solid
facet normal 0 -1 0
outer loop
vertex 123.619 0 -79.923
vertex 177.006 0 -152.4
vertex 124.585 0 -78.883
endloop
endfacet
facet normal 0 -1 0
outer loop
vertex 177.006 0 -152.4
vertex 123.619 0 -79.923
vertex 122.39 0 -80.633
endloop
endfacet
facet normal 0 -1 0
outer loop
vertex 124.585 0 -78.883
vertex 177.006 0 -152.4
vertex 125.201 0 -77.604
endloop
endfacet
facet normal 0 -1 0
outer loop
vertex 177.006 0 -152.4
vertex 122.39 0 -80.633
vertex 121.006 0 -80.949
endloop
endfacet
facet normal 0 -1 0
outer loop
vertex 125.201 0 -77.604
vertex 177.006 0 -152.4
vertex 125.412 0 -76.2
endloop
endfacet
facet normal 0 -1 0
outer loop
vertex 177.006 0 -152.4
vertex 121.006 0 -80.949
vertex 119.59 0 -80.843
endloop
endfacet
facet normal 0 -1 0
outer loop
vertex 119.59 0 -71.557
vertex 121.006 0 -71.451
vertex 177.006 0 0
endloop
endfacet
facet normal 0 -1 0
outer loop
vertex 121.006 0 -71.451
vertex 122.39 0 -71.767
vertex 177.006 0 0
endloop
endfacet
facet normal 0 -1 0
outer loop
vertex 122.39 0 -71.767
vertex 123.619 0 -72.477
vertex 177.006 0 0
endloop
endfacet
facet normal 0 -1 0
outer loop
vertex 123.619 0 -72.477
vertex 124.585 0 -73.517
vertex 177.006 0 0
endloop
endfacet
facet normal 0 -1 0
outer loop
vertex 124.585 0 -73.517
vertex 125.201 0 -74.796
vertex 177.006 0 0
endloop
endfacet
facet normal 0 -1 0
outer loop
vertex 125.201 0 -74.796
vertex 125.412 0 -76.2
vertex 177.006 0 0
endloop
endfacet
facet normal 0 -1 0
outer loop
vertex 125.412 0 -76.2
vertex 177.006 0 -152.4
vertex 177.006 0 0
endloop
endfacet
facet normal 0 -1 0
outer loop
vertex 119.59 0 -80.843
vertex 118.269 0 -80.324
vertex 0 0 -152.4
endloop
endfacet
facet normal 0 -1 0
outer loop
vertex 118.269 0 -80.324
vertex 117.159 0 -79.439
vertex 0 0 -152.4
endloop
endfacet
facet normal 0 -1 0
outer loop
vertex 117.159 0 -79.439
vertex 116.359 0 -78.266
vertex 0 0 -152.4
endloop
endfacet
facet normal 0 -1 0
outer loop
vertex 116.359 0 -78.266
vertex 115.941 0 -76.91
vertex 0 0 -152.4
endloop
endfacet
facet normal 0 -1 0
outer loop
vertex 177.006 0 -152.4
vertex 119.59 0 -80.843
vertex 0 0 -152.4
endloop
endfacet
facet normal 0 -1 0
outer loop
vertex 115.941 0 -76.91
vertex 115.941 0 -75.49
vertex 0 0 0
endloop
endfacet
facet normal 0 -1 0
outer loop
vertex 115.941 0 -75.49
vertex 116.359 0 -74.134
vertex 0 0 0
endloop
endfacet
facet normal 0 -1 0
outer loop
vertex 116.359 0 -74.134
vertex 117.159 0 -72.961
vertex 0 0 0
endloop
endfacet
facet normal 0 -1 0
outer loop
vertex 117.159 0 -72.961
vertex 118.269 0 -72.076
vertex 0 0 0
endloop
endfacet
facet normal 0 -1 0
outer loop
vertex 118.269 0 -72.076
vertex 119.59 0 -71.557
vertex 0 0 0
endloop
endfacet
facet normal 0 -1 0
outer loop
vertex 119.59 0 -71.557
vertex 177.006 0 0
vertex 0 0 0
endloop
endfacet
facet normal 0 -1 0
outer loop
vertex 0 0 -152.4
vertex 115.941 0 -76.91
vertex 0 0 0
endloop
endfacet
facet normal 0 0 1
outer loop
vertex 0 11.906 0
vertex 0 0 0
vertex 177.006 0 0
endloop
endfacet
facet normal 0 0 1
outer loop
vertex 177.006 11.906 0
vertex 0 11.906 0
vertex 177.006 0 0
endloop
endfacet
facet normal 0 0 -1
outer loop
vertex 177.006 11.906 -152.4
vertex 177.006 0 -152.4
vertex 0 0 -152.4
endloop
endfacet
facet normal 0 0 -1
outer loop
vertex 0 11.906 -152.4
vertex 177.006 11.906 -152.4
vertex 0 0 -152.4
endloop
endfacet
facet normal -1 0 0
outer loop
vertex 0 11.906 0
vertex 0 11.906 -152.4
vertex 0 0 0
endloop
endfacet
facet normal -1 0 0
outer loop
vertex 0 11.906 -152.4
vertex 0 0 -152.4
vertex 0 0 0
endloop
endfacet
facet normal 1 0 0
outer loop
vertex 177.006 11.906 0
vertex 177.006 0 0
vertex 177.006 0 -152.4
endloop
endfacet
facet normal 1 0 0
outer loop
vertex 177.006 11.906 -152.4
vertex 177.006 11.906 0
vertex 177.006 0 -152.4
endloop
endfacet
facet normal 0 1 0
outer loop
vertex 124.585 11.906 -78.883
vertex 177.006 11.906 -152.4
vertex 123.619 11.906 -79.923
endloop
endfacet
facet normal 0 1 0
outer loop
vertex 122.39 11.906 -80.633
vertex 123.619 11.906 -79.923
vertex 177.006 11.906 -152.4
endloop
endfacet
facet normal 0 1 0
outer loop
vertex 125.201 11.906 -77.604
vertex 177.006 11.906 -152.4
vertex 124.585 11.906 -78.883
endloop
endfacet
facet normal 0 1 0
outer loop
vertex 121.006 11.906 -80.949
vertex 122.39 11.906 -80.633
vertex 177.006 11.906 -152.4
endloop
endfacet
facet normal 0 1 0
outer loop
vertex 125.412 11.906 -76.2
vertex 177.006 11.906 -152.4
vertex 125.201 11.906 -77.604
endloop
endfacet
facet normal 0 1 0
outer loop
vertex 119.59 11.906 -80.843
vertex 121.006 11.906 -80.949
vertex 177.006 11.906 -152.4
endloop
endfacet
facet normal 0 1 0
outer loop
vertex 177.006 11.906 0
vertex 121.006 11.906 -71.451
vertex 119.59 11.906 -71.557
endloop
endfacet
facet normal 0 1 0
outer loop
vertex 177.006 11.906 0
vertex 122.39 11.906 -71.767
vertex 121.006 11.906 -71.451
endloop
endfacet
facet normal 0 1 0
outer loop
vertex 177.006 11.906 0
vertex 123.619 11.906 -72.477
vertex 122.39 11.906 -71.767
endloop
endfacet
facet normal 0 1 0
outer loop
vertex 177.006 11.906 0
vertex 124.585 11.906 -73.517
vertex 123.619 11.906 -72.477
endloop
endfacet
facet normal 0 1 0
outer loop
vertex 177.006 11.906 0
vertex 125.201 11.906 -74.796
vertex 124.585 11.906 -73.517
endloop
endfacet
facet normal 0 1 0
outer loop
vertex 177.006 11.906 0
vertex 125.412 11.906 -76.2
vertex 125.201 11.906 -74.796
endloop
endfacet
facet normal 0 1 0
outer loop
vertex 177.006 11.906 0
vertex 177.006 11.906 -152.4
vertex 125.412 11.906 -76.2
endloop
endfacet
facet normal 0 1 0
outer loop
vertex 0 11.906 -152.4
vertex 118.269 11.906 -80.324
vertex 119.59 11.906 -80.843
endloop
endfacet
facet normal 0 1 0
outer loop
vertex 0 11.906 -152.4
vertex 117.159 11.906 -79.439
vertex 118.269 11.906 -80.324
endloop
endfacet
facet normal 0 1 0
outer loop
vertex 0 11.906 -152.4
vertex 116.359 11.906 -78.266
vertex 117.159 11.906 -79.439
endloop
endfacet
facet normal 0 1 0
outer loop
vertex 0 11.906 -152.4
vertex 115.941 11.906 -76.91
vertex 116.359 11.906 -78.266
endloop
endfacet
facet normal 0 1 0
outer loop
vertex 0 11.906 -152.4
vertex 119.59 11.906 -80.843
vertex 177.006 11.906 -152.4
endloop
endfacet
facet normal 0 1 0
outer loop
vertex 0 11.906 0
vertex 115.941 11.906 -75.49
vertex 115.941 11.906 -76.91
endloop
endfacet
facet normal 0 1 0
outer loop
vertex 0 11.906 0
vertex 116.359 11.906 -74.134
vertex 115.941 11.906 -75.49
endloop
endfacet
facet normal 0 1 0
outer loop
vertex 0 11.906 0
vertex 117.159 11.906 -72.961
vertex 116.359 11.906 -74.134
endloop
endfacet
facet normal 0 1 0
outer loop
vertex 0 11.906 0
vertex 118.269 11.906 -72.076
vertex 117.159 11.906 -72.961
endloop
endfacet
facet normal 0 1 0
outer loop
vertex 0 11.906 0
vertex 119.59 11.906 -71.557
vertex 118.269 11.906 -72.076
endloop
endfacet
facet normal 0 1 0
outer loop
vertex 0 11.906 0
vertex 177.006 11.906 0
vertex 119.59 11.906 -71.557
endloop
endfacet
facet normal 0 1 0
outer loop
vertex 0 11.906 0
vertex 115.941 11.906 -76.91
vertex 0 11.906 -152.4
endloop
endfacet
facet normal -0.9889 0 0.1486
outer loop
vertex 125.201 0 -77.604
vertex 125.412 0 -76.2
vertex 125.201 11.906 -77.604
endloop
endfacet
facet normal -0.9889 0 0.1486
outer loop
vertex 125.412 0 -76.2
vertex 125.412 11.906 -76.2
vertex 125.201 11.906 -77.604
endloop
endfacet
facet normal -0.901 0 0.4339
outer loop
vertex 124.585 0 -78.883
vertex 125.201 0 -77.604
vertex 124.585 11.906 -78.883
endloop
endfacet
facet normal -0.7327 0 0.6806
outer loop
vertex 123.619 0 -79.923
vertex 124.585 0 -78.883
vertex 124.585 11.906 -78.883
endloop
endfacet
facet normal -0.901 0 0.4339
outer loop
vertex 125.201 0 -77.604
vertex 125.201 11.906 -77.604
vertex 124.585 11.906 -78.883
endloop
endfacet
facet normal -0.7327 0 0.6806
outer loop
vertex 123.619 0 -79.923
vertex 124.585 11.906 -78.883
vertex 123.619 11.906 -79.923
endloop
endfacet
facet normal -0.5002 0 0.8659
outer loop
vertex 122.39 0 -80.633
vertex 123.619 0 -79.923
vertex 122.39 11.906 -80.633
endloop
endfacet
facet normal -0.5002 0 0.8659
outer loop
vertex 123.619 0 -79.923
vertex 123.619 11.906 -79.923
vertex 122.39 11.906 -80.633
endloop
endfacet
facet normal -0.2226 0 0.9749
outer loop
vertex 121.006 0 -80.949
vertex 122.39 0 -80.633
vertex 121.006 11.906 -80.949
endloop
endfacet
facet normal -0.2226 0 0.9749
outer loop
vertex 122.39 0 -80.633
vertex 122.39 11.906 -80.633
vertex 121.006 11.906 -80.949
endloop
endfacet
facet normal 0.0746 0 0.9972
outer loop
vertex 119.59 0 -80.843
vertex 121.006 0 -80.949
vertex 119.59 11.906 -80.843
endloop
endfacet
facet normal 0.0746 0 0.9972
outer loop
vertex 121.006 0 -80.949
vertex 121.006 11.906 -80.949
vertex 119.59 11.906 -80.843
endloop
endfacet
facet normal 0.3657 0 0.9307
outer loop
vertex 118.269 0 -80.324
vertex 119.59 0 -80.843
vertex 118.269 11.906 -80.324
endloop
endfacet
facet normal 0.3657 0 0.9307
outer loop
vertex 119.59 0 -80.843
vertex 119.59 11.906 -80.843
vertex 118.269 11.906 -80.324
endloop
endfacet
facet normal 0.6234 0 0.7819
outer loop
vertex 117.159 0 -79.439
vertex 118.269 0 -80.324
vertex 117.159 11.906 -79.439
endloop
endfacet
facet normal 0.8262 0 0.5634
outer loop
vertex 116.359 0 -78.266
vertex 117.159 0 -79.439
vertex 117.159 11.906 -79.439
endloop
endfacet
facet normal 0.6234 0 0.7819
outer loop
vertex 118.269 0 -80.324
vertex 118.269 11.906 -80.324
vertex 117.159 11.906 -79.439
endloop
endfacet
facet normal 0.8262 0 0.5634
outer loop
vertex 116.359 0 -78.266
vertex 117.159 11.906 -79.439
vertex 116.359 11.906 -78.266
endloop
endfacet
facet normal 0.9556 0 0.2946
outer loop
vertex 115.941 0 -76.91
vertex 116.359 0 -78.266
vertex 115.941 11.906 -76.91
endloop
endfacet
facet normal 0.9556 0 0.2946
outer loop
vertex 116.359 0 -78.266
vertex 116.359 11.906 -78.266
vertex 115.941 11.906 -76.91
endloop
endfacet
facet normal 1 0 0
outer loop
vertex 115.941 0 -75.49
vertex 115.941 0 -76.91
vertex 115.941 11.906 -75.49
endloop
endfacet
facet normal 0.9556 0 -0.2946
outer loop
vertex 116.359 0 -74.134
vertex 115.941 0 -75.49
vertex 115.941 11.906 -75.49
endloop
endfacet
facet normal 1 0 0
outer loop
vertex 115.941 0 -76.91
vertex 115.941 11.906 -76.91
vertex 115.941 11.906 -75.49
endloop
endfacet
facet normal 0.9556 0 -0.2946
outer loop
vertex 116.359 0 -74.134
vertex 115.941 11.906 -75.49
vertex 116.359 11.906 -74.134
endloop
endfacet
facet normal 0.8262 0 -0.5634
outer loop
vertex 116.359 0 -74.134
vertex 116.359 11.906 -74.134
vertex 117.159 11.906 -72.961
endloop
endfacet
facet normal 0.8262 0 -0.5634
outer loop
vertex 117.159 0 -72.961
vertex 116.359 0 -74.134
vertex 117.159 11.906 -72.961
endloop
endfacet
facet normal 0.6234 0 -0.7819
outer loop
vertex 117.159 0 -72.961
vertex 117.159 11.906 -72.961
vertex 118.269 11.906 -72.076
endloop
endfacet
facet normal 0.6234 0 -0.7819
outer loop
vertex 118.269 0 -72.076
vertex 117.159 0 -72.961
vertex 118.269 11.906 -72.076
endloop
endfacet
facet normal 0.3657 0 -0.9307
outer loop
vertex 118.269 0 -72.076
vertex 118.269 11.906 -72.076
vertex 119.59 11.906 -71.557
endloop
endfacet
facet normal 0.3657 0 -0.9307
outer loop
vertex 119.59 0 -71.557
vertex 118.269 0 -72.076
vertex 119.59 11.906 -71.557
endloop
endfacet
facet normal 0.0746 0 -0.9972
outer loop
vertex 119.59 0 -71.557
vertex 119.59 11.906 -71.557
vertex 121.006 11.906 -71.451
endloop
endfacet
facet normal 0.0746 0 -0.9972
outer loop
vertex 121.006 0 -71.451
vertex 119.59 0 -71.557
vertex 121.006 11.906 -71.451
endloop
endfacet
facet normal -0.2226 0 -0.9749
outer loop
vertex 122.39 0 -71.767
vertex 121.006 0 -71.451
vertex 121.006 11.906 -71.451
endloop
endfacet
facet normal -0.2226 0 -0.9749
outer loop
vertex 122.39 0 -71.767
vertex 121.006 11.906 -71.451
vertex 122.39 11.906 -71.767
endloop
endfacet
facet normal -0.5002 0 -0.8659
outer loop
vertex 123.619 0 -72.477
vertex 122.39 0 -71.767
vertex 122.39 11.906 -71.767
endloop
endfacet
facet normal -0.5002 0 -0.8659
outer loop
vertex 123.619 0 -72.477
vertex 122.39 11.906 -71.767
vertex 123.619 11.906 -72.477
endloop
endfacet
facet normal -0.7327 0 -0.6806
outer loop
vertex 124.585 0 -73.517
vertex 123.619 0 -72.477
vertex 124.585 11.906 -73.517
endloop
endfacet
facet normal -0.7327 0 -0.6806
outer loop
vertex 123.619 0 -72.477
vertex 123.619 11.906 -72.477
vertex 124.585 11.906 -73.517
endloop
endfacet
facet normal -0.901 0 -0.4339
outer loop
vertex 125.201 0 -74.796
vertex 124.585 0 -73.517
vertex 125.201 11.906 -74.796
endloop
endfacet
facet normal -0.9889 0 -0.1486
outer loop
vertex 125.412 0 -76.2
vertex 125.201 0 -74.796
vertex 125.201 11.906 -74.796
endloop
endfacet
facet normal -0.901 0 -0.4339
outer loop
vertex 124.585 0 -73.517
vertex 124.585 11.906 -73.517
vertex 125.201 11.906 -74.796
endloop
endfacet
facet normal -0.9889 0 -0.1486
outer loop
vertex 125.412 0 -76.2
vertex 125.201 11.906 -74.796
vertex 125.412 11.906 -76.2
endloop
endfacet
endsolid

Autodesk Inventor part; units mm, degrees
ref_plane "YZ Plane" through (0, 0, 0) normal (1, 0, 0) x (0, 1, 0)
ref_plane "XZ Plane" through (0, 0, 0) normal (0, 1, 0) x (-1, 0, 0)
ref_plane "XY Plane" through (0, 0, 0) normal (0, 0, 1) x (1, 0, 0)
sketch "Sketch1" plane through (0, 0, 0) normal (0, 1, 0) x (-1, 0, 0)
  line L0 (0, 0) -> (-177.0062, 0)
  line L1 (-177.0062, 0) -> (-177.0062, -152.4)
  line L2 (-177.0062, -152.4) -> (0, -152.4)
  line L3 (0, -152.4) -> (0, 0)
  dimension "d0" = 177.0062
  dimension "d1" = 152.4
extrude "Extrusion1" add sketch "Sketch1" along normal blind 11.9062
sketch "Sketch2" plane through (0, 11.9062, 0) normal (0, 1, 0) x (1, 0, 0)
  line L0 (0, 0) -> (177.0062, 0) projected
  line L1 (177.0062, 0) -> (177.0062, 152.4) projected
  line L2 (177.0062, 152.4) -> (0, 152.4) projected
  line L3 (0, 152.4) -> (0, 0) projected
  line L4 (0, 0) -> (177.0062, 0) projected
  line L5 (177.0062, 76.2) -> (120.65, 76.2)
  circle A0 centre (120.65, 76.2) radius 4.7625
  dimension "d4" = 56.3563
  dimension "d5" = 9.525
extrude "Extrusion2" cut sketch "Sketch2" against normal up to surface (11.9062 mm away) contours A0
properties part number "Stage2Wall" material "Wood (Birch)"
